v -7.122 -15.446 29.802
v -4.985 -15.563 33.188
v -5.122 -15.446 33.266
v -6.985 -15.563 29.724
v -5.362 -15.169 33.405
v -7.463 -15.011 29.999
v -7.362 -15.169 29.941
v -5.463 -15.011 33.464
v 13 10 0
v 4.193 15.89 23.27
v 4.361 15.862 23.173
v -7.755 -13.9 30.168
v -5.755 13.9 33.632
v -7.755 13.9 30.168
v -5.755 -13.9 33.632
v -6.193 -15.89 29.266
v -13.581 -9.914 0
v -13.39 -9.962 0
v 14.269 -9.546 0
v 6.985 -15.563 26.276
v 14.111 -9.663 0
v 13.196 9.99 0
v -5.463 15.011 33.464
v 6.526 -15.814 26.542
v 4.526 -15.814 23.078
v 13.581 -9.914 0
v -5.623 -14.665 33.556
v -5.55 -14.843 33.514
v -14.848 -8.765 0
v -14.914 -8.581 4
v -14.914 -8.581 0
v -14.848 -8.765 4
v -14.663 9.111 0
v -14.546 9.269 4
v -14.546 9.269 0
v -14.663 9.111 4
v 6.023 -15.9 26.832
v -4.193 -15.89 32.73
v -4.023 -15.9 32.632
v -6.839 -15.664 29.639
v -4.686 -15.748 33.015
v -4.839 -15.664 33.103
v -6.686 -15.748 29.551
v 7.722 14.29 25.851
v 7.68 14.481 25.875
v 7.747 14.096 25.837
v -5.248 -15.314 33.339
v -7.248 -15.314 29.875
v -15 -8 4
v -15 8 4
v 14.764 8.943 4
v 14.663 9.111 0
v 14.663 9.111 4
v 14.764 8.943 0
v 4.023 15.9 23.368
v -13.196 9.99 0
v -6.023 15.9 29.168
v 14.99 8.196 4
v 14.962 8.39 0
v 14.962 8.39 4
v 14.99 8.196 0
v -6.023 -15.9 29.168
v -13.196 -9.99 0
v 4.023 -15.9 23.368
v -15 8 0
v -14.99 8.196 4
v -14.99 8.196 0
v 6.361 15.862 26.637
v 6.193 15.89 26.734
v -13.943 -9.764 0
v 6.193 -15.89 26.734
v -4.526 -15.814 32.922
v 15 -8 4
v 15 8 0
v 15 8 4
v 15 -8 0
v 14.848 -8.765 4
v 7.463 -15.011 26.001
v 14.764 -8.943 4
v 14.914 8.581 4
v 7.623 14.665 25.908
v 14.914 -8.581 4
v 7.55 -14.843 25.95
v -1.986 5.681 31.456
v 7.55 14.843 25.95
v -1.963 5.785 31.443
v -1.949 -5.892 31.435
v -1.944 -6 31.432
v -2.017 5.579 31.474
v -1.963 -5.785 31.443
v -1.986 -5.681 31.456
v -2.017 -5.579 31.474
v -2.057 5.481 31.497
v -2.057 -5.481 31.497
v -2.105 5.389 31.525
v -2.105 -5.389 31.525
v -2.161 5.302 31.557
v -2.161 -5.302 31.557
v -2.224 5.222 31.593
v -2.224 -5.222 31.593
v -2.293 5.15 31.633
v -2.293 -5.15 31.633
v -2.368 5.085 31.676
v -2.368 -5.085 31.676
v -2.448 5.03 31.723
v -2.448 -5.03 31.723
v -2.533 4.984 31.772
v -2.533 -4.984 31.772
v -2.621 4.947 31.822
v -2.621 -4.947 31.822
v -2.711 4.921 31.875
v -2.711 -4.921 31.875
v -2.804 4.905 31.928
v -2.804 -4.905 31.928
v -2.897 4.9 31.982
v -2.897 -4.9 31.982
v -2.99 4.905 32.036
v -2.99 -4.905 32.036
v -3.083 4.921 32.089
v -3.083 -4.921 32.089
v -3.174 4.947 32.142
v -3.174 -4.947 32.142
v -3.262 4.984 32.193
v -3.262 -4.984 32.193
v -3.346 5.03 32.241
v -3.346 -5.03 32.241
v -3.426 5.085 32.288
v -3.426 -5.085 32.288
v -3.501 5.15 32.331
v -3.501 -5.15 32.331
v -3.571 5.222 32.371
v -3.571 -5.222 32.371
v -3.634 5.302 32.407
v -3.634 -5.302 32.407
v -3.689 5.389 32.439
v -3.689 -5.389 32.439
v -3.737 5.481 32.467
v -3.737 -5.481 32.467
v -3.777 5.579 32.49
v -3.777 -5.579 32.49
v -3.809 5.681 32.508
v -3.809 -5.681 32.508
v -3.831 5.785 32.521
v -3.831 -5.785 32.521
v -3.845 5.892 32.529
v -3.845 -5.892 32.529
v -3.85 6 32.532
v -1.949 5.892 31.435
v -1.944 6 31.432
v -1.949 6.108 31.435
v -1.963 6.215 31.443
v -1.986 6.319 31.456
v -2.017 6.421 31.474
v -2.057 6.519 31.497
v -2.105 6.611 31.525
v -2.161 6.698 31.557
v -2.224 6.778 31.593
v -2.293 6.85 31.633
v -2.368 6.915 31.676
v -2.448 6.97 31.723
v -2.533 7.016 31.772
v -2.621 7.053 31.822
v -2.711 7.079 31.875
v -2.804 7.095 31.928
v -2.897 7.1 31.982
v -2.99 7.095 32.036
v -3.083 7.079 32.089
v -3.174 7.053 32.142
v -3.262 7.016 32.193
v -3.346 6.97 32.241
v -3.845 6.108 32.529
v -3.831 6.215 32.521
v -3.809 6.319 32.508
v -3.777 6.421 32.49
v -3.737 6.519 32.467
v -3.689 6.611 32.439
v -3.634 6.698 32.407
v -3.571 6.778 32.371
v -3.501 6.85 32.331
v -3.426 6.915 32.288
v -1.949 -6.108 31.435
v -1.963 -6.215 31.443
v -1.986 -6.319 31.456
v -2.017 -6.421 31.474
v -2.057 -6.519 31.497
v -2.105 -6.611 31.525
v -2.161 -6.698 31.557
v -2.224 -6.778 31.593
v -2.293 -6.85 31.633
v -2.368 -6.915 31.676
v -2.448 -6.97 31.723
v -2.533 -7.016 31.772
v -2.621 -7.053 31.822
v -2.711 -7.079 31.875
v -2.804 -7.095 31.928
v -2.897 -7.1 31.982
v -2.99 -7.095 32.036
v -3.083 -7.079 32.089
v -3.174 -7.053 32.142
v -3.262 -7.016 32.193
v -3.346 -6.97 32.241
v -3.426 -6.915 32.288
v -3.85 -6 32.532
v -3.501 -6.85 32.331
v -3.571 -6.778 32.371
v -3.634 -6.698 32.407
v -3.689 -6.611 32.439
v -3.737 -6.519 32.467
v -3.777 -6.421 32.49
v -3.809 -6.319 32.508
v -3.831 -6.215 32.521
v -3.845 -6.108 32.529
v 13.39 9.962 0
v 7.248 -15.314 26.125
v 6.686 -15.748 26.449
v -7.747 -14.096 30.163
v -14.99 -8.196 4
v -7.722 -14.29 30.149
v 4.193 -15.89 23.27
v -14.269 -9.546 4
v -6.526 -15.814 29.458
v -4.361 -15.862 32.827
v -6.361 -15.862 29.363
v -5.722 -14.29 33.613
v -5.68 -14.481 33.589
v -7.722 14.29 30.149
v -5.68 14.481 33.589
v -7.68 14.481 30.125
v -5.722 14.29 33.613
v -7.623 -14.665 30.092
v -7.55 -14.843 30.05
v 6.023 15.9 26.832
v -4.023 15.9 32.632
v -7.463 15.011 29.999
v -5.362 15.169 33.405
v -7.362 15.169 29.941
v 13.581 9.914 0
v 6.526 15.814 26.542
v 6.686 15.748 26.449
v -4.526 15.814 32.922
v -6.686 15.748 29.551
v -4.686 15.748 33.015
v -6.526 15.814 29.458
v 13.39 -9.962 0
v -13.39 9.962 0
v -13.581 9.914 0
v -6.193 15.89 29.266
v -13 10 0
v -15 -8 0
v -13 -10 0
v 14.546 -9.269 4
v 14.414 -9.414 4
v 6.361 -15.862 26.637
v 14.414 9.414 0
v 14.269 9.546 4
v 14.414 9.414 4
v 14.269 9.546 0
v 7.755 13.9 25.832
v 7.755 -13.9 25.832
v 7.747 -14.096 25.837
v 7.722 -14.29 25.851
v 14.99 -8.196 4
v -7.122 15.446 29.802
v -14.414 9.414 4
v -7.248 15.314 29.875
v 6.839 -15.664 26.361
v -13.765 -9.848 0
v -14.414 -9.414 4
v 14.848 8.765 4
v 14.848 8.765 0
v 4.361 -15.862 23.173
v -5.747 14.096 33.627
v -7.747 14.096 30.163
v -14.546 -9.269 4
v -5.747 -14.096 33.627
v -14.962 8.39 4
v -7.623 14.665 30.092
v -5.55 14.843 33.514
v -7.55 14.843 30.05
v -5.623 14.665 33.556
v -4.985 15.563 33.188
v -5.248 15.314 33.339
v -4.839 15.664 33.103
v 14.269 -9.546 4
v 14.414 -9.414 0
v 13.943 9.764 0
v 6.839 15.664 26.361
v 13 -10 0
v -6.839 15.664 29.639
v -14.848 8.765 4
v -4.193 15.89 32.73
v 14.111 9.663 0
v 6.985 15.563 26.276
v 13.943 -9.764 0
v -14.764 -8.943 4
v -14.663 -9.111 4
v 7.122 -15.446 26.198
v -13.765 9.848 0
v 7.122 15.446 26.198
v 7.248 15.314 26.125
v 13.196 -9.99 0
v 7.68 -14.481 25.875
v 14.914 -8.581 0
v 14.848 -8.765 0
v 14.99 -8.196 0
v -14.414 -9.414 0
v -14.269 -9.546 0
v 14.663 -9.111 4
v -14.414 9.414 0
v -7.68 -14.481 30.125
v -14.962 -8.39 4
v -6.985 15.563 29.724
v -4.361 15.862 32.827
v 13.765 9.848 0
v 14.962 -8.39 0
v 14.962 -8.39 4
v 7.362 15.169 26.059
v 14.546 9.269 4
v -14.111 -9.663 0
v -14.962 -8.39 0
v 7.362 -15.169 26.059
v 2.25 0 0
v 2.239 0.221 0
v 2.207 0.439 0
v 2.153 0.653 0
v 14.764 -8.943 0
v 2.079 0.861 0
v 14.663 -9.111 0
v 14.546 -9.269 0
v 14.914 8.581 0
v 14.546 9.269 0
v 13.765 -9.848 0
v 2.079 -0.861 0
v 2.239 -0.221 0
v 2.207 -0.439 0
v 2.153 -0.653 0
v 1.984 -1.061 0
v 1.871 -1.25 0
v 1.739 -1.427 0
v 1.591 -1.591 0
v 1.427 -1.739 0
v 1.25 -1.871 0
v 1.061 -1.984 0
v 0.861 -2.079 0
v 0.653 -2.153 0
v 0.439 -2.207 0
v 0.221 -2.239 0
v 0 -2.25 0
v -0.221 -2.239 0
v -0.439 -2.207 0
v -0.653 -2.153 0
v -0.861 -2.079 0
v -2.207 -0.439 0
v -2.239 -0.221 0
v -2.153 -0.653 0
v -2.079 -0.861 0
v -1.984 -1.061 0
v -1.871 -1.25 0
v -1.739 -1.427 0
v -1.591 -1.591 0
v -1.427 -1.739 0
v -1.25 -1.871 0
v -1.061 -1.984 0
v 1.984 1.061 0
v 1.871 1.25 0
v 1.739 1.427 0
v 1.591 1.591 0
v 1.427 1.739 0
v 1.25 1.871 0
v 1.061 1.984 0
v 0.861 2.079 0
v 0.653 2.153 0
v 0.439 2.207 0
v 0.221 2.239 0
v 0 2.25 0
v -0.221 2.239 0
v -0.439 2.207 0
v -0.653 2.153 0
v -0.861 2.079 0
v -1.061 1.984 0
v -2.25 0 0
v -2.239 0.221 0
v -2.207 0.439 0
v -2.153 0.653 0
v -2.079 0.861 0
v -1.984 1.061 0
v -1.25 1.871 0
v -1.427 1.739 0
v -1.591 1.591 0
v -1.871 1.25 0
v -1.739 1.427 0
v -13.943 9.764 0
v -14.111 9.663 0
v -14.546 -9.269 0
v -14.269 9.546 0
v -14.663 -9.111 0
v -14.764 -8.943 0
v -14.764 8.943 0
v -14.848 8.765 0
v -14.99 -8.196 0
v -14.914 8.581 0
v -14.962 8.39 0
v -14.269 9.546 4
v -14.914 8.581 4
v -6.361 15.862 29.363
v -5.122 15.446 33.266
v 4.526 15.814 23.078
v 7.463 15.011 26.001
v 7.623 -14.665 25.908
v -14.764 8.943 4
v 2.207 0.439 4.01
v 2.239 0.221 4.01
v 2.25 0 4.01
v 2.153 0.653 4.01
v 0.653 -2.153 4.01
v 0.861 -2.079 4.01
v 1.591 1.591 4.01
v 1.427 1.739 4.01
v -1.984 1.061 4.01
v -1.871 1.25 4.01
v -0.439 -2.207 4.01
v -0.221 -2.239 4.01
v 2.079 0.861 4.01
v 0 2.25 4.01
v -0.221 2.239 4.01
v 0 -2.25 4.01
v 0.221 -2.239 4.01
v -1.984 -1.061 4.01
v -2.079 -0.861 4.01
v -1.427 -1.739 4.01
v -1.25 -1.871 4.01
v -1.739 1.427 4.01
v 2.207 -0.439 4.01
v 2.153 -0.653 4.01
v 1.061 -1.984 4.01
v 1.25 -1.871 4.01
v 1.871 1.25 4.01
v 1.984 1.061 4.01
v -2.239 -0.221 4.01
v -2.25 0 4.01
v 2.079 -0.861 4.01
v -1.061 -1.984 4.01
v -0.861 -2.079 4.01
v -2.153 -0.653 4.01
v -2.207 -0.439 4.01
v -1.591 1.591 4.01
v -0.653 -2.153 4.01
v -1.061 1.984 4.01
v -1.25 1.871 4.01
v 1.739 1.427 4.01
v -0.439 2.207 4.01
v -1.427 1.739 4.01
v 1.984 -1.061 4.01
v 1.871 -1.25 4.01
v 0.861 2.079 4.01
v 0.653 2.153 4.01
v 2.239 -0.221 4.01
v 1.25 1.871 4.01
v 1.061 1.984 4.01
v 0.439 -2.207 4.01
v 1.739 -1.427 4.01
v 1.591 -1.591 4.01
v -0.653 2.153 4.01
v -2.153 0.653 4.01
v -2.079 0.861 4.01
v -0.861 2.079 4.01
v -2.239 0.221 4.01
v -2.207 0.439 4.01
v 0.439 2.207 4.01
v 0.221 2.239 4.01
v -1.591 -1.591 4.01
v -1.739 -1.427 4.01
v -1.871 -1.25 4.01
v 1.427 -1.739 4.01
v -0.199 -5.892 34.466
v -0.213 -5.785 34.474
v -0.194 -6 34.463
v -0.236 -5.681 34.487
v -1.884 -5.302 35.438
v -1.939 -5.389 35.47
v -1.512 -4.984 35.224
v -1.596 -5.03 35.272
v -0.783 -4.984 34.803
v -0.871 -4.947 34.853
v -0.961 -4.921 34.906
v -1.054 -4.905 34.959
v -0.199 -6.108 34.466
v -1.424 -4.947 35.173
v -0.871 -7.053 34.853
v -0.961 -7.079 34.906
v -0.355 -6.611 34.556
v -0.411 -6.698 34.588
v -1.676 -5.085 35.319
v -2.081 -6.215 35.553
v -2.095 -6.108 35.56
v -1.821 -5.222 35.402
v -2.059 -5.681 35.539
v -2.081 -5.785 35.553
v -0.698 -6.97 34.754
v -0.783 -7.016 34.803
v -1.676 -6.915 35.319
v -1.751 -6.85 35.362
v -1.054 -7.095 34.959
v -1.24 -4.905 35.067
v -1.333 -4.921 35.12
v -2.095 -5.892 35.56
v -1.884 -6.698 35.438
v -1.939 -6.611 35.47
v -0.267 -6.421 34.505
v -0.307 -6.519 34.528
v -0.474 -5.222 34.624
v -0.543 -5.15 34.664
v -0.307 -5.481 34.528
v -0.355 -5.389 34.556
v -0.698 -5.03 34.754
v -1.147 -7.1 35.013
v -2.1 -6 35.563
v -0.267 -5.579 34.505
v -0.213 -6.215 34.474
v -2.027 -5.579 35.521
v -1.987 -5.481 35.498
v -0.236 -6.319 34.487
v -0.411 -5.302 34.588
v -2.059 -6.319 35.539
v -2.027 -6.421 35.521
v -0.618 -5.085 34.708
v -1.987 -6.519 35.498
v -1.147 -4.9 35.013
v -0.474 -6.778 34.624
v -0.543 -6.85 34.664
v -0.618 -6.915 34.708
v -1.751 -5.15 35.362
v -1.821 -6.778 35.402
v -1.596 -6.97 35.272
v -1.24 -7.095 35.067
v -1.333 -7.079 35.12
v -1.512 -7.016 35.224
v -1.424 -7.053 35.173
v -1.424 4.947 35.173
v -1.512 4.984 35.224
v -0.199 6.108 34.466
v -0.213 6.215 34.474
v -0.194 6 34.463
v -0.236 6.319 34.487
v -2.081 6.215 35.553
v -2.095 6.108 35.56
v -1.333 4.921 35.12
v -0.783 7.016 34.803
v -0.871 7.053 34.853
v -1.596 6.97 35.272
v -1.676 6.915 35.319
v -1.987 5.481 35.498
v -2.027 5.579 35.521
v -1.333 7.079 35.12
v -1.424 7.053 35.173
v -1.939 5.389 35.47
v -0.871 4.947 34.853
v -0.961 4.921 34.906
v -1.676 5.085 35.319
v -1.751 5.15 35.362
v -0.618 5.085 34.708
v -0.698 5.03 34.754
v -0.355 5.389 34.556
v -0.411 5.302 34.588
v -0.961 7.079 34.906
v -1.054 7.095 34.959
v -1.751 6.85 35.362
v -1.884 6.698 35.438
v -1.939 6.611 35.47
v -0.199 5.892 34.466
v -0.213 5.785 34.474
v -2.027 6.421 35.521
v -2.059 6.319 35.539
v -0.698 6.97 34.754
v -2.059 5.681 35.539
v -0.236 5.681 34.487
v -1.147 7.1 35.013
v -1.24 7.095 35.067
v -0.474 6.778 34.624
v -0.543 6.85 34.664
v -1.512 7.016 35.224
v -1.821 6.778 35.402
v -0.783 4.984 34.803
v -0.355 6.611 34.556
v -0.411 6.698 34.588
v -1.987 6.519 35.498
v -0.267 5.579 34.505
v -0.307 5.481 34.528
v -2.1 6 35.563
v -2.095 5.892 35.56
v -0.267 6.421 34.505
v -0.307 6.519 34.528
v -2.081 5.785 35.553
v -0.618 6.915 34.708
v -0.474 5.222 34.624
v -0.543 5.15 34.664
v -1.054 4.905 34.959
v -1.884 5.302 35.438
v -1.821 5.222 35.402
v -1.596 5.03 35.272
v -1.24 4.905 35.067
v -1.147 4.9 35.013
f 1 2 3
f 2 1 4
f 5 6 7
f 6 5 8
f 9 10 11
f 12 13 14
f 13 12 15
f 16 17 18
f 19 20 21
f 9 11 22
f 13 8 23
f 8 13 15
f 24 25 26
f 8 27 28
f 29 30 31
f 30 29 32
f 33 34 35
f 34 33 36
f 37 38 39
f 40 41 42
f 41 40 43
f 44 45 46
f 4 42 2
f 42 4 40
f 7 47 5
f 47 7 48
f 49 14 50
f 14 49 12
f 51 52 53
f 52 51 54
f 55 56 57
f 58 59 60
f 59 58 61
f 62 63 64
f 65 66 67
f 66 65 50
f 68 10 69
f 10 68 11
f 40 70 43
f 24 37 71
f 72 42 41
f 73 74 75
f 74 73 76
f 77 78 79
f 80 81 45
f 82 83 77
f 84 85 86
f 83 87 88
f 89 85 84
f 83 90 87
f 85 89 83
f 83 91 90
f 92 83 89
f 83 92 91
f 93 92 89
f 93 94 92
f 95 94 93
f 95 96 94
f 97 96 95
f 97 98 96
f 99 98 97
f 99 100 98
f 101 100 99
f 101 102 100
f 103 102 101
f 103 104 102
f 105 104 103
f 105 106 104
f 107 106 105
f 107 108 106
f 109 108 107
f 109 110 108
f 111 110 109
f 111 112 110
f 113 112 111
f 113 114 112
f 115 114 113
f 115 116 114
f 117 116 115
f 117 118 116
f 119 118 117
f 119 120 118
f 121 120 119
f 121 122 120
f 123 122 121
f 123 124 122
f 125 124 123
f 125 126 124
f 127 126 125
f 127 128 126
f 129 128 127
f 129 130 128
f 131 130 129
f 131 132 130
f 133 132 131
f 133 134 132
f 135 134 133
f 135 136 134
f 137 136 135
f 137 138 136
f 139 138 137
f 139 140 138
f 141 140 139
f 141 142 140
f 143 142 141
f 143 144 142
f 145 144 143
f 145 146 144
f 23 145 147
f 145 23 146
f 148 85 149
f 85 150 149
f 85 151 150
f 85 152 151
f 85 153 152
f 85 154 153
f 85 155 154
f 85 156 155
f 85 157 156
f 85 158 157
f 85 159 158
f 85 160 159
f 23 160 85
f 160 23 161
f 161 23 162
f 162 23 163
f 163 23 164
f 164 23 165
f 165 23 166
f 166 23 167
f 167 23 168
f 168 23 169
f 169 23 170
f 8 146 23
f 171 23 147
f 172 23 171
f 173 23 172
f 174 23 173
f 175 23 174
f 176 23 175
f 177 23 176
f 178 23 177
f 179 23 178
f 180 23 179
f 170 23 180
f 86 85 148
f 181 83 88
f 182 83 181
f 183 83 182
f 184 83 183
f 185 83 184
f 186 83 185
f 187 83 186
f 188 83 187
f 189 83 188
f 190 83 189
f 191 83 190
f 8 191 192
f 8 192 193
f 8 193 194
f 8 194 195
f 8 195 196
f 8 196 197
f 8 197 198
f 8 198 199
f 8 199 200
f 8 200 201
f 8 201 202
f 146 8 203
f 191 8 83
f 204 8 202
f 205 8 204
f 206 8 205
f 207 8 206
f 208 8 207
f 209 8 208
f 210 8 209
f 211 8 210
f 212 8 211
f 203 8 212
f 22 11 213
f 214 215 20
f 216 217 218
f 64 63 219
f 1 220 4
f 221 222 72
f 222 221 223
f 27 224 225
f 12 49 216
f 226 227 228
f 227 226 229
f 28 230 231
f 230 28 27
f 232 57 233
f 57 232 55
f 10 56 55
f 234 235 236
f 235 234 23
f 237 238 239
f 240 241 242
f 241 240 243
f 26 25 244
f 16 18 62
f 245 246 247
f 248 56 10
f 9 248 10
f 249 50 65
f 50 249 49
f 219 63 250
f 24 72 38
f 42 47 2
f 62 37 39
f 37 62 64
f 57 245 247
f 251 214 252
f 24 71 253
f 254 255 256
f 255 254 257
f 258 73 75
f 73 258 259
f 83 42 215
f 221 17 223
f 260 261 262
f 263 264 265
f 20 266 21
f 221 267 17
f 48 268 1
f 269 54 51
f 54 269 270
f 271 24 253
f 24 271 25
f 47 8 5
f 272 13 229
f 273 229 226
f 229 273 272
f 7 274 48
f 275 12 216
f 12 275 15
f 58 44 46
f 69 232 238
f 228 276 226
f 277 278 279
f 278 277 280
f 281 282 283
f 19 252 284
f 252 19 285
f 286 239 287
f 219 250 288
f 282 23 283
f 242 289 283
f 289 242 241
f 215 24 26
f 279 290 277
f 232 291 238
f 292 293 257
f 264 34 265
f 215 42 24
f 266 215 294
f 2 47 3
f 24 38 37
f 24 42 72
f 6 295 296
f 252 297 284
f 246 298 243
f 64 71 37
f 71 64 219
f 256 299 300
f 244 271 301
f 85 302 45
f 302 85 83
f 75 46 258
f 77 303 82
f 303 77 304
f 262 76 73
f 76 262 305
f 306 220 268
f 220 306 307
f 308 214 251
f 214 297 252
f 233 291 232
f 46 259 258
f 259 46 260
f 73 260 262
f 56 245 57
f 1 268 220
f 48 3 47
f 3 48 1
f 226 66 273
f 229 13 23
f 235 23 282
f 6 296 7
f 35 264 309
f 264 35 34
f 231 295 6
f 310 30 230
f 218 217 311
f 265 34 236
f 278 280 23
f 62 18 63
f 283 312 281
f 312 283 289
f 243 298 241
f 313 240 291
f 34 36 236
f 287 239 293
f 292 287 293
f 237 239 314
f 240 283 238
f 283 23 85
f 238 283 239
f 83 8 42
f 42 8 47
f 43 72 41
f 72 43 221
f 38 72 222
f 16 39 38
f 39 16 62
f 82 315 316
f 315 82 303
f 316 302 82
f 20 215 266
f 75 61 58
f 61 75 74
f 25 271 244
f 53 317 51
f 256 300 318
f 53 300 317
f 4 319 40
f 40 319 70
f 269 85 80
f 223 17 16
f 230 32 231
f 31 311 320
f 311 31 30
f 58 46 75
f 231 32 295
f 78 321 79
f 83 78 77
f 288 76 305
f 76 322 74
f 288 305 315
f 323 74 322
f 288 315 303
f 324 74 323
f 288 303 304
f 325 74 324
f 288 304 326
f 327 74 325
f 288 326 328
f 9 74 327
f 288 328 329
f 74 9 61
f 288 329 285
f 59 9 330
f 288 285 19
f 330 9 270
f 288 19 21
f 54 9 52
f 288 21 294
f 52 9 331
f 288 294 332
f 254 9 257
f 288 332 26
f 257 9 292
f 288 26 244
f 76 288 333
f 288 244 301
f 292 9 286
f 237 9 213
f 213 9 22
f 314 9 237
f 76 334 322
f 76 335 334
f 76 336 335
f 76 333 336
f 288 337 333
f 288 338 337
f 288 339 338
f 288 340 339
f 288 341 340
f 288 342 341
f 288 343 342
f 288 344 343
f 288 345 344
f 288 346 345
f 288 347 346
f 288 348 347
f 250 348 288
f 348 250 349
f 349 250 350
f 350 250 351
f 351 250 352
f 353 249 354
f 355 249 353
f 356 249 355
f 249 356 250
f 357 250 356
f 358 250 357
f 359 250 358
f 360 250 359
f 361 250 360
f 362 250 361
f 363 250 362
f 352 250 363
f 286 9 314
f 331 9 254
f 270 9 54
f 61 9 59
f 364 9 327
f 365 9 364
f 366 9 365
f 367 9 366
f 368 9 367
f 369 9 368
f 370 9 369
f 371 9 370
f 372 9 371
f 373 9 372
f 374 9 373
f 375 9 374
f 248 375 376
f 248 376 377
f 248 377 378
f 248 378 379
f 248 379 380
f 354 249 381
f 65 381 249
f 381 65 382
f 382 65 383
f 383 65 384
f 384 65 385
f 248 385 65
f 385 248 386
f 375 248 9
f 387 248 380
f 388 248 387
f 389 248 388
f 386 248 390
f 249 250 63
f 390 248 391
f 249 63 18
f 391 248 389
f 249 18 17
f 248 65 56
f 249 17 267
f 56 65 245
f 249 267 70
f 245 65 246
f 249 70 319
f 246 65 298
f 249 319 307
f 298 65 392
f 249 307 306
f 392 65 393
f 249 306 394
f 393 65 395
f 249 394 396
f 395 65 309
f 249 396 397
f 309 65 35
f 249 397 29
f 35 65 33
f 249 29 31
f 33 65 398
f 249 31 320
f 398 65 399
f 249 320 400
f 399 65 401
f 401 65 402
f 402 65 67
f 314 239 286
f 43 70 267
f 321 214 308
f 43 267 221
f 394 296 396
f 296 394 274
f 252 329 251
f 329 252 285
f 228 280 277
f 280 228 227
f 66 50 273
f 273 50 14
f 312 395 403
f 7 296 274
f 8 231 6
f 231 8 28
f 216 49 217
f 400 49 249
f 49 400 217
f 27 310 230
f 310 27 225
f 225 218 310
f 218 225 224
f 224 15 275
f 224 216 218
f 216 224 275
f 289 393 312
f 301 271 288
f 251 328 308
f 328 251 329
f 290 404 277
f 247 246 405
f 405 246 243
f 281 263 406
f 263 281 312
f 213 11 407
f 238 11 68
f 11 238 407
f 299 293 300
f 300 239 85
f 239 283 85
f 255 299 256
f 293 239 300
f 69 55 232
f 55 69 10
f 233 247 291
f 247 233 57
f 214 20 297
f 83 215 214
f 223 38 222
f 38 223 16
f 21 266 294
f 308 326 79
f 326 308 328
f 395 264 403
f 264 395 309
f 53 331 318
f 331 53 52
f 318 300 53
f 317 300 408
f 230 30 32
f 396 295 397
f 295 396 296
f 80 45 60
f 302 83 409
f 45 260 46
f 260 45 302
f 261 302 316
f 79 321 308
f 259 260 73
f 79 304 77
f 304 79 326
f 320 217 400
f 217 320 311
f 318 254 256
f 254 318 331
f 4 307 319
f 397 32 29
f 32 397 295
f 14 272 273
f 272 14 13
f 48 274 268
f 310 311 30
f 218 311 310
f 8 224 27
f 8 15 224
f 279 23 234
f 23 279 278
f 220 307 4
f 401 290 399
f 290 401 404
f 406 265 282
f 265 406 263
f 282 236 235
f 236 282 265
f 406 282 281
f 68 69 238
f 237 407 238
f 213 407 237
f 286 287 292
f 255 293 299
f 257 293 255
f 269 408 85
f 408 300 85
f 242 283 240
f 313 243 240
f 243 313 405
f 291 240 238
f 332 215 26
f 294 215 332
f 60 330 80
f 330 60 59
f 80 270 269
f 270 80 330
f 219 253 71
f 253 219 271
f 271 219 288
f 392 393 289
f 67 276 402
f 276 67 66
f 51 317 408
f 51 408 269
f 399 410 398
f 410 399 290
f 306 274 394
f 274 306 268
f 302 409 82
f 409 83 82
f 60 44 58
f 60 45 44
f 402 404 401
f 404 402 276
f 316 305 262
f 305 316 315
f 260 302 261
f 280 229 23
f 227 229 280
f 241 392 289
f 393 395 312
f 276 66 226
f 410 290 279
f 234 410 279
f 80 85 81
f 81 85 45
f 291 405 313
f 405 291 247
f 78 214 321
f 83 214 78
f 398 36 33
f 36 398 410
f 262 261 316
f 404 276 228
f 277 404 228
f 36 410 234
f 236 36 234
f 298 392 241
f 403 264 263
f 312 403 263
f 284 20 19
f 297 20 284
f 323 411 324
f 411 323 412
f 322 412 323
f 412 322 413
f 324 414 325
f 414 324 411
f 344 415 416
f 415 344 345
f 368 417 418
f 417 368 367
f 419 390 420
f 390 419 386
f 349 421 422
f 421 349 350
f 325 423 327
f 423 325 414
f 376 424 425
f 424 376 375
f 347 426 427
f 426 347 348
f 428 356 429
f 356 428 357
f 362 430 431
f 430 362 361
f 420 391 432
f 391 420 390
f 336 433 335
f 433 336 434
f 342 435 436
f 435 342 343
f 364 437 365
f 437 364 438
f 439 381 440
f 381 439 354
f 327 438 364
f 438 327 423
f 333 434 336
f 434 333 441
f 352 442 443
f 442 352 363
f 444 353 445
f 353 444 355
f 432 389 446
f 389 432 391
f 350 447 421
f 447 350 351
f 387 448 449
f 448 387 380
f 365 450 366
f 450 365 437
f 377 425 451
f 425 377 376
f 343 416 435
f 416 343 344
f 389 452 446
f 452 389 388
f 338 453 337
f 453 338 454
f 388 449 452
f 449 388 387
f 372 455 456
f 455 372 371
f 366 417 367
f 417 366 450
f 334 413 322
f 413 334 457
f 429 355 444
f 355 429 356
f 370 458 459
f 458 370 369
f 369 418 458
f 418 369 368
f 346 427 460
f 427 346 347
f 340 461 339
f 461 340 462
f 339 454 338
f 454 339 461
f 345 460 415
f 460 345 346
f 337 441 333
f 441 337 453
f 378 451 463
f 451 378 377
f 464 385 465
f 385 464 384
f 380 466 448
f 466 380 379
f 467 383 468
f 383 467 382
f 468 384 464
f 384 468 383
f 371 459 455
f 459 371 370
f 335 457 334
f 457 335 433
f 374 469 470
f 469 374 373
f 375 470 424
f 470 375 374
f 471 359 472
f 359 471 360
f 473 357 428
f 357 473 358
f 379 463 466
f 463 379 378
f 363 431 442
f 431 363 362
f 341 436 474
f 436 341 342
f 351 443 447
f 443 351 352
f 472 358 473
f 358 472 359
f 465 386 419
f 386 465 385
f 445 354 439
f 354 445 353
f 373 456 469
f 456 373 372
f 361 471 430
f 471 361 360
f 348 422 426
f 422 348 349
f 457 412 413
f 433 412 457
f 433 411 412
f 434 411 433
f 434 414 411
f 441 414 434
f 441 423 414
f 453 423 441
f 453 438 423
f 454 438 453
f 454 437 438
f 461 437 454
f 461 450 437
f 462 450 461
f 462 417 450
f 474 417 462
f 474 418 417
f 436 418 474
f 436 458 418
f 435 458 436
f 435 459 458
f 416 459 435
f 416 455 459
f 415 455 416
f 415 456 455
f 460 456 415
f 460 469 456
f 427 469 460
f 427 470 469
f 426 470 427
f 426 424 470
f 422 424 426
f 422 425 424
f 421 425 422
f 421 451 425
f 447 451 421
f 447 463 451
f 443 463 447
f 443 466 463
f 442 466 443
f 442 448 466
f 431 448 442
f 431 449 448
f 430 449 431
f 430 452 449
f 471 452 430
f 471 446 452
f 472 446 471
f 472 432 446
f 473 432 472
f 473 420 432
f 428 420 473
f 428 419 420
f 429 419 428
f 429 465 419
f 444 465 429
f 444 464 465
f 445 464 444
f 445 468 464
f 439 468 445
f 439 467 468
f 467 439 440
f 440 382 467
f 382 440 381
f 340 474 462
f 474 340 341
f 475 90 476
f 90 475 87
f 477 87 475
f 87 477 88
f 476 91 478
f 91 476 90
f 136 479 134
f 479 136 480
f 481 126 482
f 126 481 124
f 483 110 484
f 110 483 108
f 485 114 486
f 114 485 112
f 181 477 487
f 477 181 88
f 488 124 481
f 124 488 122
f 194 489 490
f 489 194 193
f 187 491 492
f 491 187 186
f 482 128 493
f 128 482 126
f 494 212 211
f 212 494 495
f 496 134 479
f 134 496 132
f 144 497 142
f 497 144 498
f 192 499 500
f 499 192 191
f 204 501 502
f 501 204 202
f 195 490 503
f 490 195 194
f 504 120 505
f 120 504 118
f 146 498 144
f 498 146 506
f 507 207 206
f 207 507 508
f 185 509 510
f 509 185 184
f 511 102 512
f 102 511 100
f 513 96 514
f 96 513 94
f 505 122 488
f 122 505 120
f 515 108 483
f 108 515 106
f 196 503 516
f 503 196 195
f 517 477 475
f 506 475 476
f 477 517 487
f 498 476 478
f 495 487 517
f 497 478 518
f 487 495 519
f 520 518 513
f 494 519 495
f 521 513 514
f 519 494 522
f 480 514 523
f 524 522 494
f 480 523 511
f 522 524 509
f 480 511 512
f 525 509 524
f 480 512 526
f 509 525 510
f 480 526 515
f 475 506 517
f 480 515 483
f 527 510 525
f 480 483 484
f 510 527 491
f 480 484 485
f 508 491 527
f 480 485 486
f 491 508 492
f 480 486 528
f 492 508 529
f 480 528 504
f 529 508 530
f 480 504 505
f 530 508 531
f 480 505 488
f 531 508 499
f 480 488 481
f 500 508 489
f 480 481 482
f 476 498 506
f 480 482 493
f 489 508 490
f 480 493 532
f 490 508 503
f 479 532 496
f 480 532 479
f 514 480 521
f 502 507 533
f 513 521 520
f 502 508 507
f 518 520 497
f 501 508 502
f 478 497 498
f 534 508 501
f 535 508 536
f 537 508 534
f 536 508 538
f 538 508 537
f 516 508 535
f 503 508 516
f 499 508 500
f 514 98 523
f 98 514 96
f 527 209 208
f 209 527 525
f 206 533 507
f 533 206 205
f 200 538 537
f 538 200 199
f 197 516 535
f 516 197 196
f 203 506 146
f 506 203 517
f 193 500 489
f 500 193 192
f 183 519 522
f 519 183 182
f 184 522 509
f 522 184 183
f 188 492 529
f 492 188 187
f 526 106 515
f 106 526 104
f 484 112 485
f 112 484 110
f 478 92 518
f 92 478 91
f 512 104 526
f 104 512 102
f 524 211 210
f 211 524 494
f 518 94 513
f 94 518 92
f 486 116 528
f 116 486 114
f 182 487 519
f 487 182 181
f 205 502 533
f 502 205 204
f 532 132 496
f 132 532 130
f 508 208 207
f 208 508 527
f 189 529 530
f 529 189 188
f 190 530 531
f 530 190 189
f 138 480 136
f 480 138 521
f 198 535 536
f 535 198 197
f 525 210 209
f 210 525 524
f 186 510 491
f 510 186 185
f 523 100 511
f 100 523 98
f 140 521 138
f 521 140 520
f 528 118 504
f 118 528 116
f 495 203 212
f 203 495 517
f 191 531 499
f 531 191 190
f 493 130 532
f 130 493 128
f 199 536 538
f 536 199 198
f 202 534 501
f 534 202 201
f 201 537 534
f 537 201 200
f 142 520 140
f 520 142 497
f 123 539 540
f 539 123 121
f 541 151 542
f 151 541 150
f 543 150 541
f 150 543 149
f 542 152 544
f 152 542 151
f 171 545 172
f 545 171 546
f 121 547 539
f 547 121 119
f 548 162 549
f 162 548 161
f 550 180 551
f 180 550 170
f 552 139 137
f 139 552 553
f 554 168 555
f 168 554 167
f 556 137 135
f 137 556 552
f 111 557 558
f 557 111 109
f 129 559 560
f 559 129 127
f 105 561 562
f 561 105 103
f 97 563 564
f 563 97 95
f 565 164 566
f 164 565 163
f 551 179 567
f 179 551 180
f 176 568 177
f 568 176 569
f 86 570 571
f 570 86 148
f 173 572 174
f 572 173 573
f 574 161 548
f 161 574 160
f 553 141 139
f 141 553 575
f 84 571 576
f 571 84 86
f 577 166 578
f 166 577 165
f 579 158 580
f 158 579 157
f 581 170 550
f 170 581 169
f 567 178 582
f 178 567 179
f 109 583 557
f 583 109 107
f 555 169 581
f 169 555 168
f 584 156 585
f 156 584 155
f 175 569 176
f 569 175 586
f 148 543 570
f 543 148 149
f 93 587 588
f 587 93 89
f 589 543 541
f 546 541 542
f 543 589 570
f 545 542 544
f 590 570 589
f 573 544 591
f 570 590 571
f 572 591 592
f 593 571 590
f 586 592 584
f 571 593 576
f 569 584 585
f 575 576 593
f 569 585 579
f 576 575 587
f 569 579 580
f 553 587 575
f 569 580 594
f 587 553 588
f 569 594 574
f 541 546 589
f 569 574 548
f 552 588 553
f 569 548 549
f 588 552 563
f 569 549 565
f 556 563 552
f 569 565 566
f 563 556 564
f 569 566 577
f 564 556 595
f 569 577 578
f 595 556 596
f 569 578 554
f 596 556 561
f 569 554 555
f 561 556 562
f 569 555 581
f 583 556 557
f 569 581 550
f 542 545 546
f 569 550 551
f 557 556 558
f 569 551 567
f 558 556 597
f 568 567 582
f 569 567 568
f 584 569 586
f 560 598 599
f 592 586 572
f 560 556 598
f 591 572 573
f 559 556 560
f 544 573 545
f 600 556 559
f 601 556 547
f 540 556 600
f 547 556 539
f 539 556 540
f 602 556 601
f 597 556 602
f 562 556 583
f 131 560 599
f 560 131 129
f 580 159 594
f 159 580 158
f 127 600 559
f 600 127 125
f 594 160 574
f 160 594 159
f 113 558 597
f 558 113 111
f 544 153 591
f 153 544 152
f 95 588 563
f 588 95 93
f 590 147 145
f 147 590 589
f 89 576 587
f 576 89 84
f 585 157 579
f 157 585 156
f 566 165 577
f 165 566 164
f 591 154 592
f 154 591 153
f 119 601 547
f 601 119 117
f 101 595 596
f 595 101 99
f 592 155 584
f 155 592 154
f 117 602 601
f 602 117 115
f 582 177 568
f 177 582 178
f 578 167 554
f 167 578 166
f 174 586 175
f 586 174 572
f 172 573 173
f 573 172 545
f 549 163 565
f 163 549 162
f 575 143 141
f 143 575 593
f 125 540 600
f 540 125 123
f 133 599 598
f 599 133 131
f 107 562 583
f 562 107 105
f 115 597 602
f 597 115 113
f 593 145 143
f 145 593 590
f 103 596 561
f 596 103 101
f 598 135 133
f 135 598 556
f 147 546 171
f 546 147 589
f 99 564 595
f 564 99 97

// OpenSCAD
// esp32s3-cam-case.scad — parametric friction-fit enclosure for the
// nulllaborg ESP32-S3-CAM (https://github.com/nulllaborg/esp32s3-cam).
//
// Author note: every dimension that depends on the actual board is
// flagged "MEASURE" — take calipers to your unit before printing the
// final pieces. The defaults below come from the size drawing in the
// nulllaborg repo (picture/esp32s3_cam_size.png); the very first thing
// to do is print the back_shell at 0% infill, drop your bare board in,
// and confirm it lands cleanly on the four post shoulders.
//
// Construction:
//   - Two-piece body: back_shell (USB cutout) and lid (lens window,
//     flash LED holes). They join via mating posts (lid) and shafts
//     (back) with a tunable friction fit — no screws, no snap hooks.
//   - PCB is captured by four stepped posts rising from the back-shell
//     cavity floor: a wide shoulder under the PCB acts as a positive
//     vertical stop the board lands on, and a narrower shaft above
//     passes through the M2 mounting holes and protrudes up into the
//     lid's bores.
//   - Lens window in the lid lets the FFC-mounted camera lens look
//     out the top. Two small holes flanking the lens align with the
//     GPIO3 flash LEDs on the PCB.
//   - A pry slot at one corner of the seam accepts a flat tool to
//     re-open the case.
//
// Top-of-file `mode` selects what to render:
//   "lid" / "back" / "assembly" / "exploded" / "hanger"

mode = "hanger";

// =============================================================
// FEATURE TOGGLES — flip these to include/exclude optional parts.
// =============================================================
USE_USB_C          = true;    // USB-C cutout on the right short edge
USE_FLASH_HOLES    = true;    // 2 holes in lid for the GPIO3 flash LEDs
USE_SD_SLOT        = true;   // microSD slot on bottom long edge
USE_BUTTON_HOLES   = false;   // BOOT + RESET pinholes (paperclip access)
USE_IPEX_CUTOUT    = false;   // slot for external antenna pigtail
USE_BATTERY_CUTOUT = false;   // slot for JST PH2.0 battery cable
USE_VENTS          = false;   // vent slot grid on back face
USE_KEYHOLE        = false;   // wall-mount keyhole on back face
USE_HANGER_SOCKETS = true;   // 2 sockets on -X face for the hanger pegs

// =============================================================
// PARAMETERS — tune these to match your board and your printer.
// Almost every issue you'll hit on first print is fixable here
// without touching the geometry below.
// =============================================================

// ----- PCB ----------------------------------------------------
// From picture/esp32s3_cam_size.png. MEASURE on your board.
PCB_LEN              = 40.0;   // long edge of the PCB
PCB_WID              = 27.0;   // short edge
PCB_THK              =  1.6;   // PCB thickness alone
MOUNT_HOLE_DIAM      =  2.7;   // M2 clearance (through-hole on PCB)
MOUNT_HOLE_INSET     =  2.0;   // centre-of-hole to nearest PCB edge

// ----- Camera lens window (in the lid) ------------------------
// The camera module floats on a 24-pin FFC, so its position is
// mechanically flexible. The lens folds over the WROOM-1 module and
// looks straight up through this hole. MEASURE/ADJUST as needed.
LENS_HOLE_DIAM       =  10.0;   // ~OV2640/OV3660 lens barrel clearance
LENS_HOLE_X          = 11.5;   // PCB-local X of hole centre
LENS_HOLE_Y          = PCB_WID / 2;   // PCB-local Y of hole centre

// ----- Flash LED holes (in the lid) ---------------------------
// Two white SMD flash LEDs on the PCB top side, flanking the camera
// FFC connector along the SHORT edge of the PCB opposite the USB-C
// (i.e. the -X short edge). The LEDs sit along that short edge with
// the FFC connector between them. MEASURE on your board.
FLASH_LED_HOLE_DIAM   =  3.0;
FLASH_LED_PITCH       = -22.0;  // centre-to-centre distance between LEDs (along Y)
FLASH_LED_X_FROM_EDGE =  9.0;  // distance from PCB -X edge to LED centres

// ----- USB-C connector (PCB +X short edge, surface-mount) -----
// "Y position" = distance from PCB -Y edge to centre of connector.
// The cutout sizes below are CABLE OVERMOLD clearances, not the
// connector body — they're deliberately larger than the connector so
// a typical USB-C cable's overmolded plug can be inserted. The
// connector body itself is ~8.94 × 3.26 mm, but cables won't fit if
// the opening is only that size.
// MEASURE on your board; bump up if your cable still won't fit.
USB_C_WIDTH          = 9.0;   // cable-overmold clearance, width
USB_C_HEIGHT         =  5.0;   // cable-overmold clearance, height
USB_C_Y_CENTER       = PCB_WID / 2;   // centred on short edge
USB_C_Z_OFFSET       =  3.2;   // centre relative to PCB BOTTOM (positive = above PCB)
USB_CUTOUT_SLACK     =  0.6;   // extra clearance around the cutout

// ----- microSD slot (bottom long edge, optional) --------------
SD_SLOT_WIDTH        = 13.0;
SD_SLOT_HEIGHT       =  2.0;
SD_SLOT_X_CENTER     = 12.5;   // PCB-local X of slot centre — MEASURE
SD_SLOT_Z_OFFSET     =  2.5;   // centre relative to PCB BOTTOM
SD_CUTOUT_SLACK      =  0.8;

// ----- Button pinholes (BOOT/RESET, optional) -----------------
BUTTON_HOLE_DIAM     =  2.0;
BOOT_BTN_X_FROM_EDGE =  3.0;   // BOOT: PCB +X, -Y corner; MEASURE
BOOT_BTN_Y_FROM_EDGE =  3.0;
RESET_BTN_X_FROM_EDGE = 3.0;   // RESET: PCB +X, +Y corner; MEASURE
RESET_BTN_Y_FROM_EDGE = 3.0;
BUTTON_Z_OFFSET      =  2.5;   // centre above PCB bottom

// ----- IPEX antenna cutout (optional) -------------------------
IPEX_CUTOUT_W        =  6.0;
IPEX_CUTOUT_H        =  3.0;
IPEX_Z_OFFSET        =  2.5;

// ----- Battery JST PH2.0 cutout (optional) --------------------
BATTERY_CUTOUT_W     =  6.5;
BATTERY_CUTOUT_H     =  3.5;
BATTERY_X_CENTER     =  8.0;   // PCB-local X — MEASURE
BATTERY_Z_OFFSET     =  2.5;

// ----- Case body / fit ----------------------------------------
WALL                 =  2.0;
PCB_PERIMETER_GAP    =  0.4;   // case-to-PCB tolerance (each side)
BACK_DEPTH           =  3.0;   // space below PCB (bottom of S3-CAM is flat)
FRONT_DEPTH          = 7.0;   // space above PCB (camera lens stack-up)
CASE_FILLET          =  2.0;   // outer corner rounding
$fn                  = 64;

// ----- PCB-retention posts (scaled for M2 — see hydro-dash for
// the same idiom with M2.5). Stepped post: wider SHOULDER below
// the PCB acts as a positive stop the board sits on (so you can't
// push it past), transitioning into a narrower shaft that passes
// through the M2 mounting hole and continues up past the PCB top
// by PCB_POST_PROTRUDE — far enough for the lid's mating tubes to
// slide over and create the friction fit that holds the case shut.
//
// Cross-section profile:
//                             ___       <- chamfered tip
//                            |   |
//                            |   |       <- upper shaft (through PCB,
//                            |   |          PCB_POST_DIAM dia)
//                       _____|___|_____  <- PCB rests here on shoulder
//                      |               |
//                      |               | <- shoulder
//                      |               |    (PCB_POST_SHOULDER_DIAM dia)
//                      |               |
//                      ----------------- <- back-shell cavity floor
//
// Shoulder diameter is smaller than the hydro-dash reference (4.5mm)
// because the S3-CAM's MOUNT_HOLE_INSET is only 3.2mm; a 4.5mm
// shoulder would overhang the PCB edge.
PCB_POST_SHOULDER_DIAM =  3.6; // wider seat the PCB rests on
PCB_POST_DIAM          =  2.0; // upper shaft, through M2 hole fit
PCB_POST_PROTRUDE      =  3.5; // shaft extends above PCB top to engage lid bore

// ----- Lid mating posts ---------------------------------------
// Hollow cylindrical tubes hanging from the lid ceiling, one per PCB
// mounting-hole position. Each slides OVER the protruding tip of the
// corresponding back-shell post. Friction between the bore and the
// back post shaft is what holds the case together — there are no
// snap hooks.
//
// Tune FRONT_BORE_DIAM until you get the click feel you want:
//   - too loose? decrease (toward PCB_POST_DIAM = 1.7)
//   - too tight? increase by 0.05 mm at a time
FRONT_POST_OD        =  3.6;
FRONT_BORE_DIAM      =  2.2;   // light interference with 1.7mm shaft
FRONT_POST_LEN       =  7.5;
FRONT_BORE_TOP_GAP   =  1.0;

// ----- Pry slot (for disassembly) -----------------------------
// Open slot at one corner of the seam — accepts a flat tool to twist
// the two halves apart when you need to re-open the case.
PRY_SLOT_W           =  5.0;
PRY_SLOT_D           =  1.5;

// ----- Wall mount keyhole (optional) --------------------------
KEYHOLE_DIAM_BIG     =  8.0;
KEYHOLE_DIAM_SMALL   =  4.0;
KEYHOLE_SLOT_LEN     =  6.0;
KEYHOLE_DEPTH        =  1.2;
KEYHOLE_OFFSET_FROM_TOP = 8.0;

// ----- Vent slots (optional) ----------------------------------
VENT_SLOT_LEN        = 12.0;
VENT_SLOT_W          =  1.2;
VENT_ROWS            =  2;
VENT_COLS            =  3;
VENT_PITCH_X         =  3.0;
VENT_PITCH_Y         =  2.5;

// ----- Hanger bracket (optional, mode="hanger") ---------------
// Standalone snap-on bracket that mates with the case's -X short edge
// (opposite USB-C). Two short pegs project from the hanger's mount face
// into matching sockets on the back-shell wall (subtracted only when
// USE_HANGER_SOCKETS is true). The body holds the case at a configurable
// tilt; the top tab takes a single M4 screw up into a light fixture.
//
// Geometry parameter: HANGER_TILT_DEG is the angle between the fixture
// tab (horizontal when installed) and the case-mount face. Equals the
// camera lens's angle from vertical when mounted:
//   0°  = camera looks straight down
//   45° = camera looks down-and-forward at 45° (default — good for
//         monitoring a tray below)
//   90° = camera looks straight forward (horizontal)
HANGER_TILT_DEG      = 30.0;
HANGER_BODY_HEIGHT   = 30.0;   // body height in print orientation
HANGER_PEG_DIAM      =  2.2;   // peg diameter
HANGER_PEG_LEN       =  3.5;   // peg length
HANGER_PEG_GAP       = 12.0;   // centre-to-centre between the two pegs.
                               // Kept narrow so sockets clear the corner
                               // friction-fit posts (PCB_POST_SHOULDER_DIAM
                               // at y=MOUNT_HOLE_INSET and y=PCB_WID-INSET).
HANGER_TAB_W         = 30.0;   // fixture tab width (across)
HANGER_TAB_D         = 20.0;   // fixture tab depth (front-to-back)
HANGER_TAB_T         =  4.0;   // fixture tab thickness
HANGER_SCREW_HOLE    =  4.5;   // M4 clearance for ceiling/fixture screw
HANGER_SLAB_T        =  4.0;   // case-mount slab thickness

// =============================================================
// DERIVED CONSTANTS — usually no need to touch
// =============================================================
INNER_X              = PCB_LEN + 2*PCB_PERIMETER_GAP;
INNER_Y              = PCB_WID + 2*PCB_PERIMETER_GAP;
OUTER_X              = INNER_X + 2*WALL;
OUTER_Y              = INNER_Y + 2*WALL;
TOTAL_HEIGHT         = WALL + BACK_DEPTH + PCB_THK + FRONT_DEPTH + WALL;
SEAM_Z               = WALL + BACK_DEPTH + PCB_THK;  // lid meets back here

// Mount-hole positions (PCB local coords). Order: BL, BR, TR, TL.
mount_hole_xy = [
  [MOUNT_HOLE_INSET,           MOUNT_HOLE_INSET],
  [PCB_LEN - MOUNT_HOLE_INSET, MOUNT_HOLE_INSET],
  [PCB_LEN - MOUNT_HOLE_INSET, PCB_WID - MOUNT_HOLE_INSET],
  [MOUNT_HOLE_INSET,           PCB_WID - MOUNT_HOLE_INSET],
];

// =============================================================
// HELPER MODULES
// =============================================================

// 2D rounded square -> extruded box with filleted vertical edges
module rounded_box(x, y, z, r=CASE_FILLET) {
  linear_extrude(z)
    offset(r=r) offset(r=-r) square([x, y]);
}

// PCB alignment post — stepped: wide shoulder below PCB, narrow shaft
// through PCB and above. The shoulder's top face is the surface the
// PCB rests on (positive vertical stop, can't be pushed past).
module pcb_post(h_below_pcb, h_above_pcb) {
  upper_h = PCB_THK + h_above_pcb;
  // Shoulder (below PCB)
  cylinder(d=PCB_POST_SHOULDER_DIAM, h=h_below_pcb);
  // Upper shaft (through PCB hole + protrude into lid bore)
  translate([0, 0, h_below_pcb]) {
    cylinder(d=PCB_POST_DIAM, h=upper_h - 0.6);
    // Chamfered tip — narrows over the top 0.6mm so the bore (and the
    // PCB hole on insertion) can self-centre on the post.
    translate([0, 0, upper_h - 0.6])
      cylinder(d1=PCB_POST_DIAM, d2=PCB_POST_DIAM - 0.6, h=0.6);
  }
}

// USB connector cutout — runs through the +X short wall.
// y_center: PCB-local Y of cutout centre. z_offset: vertical position
// relative to PCB BOTTOM surface (positive = above PCB bottom).
module usb_cutout(y_center, w, h, z_offset) {
  translate([PCB_LEN + PCB_PERIMETER_GAP - 0.5,
             y_center - w/2 - USB_CUTOUT_SLACK/2,
             WALL + BACK_DEPTH + z_offset - h/2 - USB_CUTOUT_SLACK/2])
    cube([WALL + 1.5,
          w + USB_CUTOUT_SLACK,
          h + USB_CUTOUT_SLACK]);
}

// microSD slot cutout — through the -Y long wall.
module sd_slot_cutout() {
  translate([SD_SLOT_X_CENTER - SD_SLOT_WIDTH/2 - SD_CUTOUT_SLACK/2,
             -WALL - PCB_PERIMETER_GAP - 0.5,
             WALL + BACK_DEPTH + SD_SLOT_Z_OFFSET - SD_SLOT_HEIGHT/2 - SD_CUTOUT_SLACK/2])
    cube([SD_SLOT_WIDTH + SD_CUTOUT_SLACK,
          WALL + 1.5,
          SD_SLOT_HEIGHT + SD_CUTOUT_SLACK]);
}

// IPEX antenna cutout — through the -X short wall, top-Y corner.
module ipex_cutout() {
  translate([-WALL - PCB_PERIMETER_GAP - 0.5,
             PCB_WID - IPEX_CUTOUT_W - 1.0,
             WALL + BACK_DEPTH + IPEX_Z_OFFSET - IPEX_CUTOUT_H/2])
    cube([WALL + 1.5, IPEX_CUTOUT_W, IPEX_CUTOUT_H]);
}

// JST PH2.0 battery connector cutout — through the -Y long wall.
module battery_cutout() {
  translate([BATTERY_X_CENTER - BATTERY_CUTOUT_W/2,
             -WALL - PCB_PERIMETER_GAP - 0.5,
             WALL + BACK_DEPTH + BATTERY_Z_OFFSET - BATTERY_CUTOUT_H/2])
    cube([BATTERY_CUTOUT_W, WALL + 1.5, BATTERY_CUTOUT_H]);
}

// BOOT/RESET pinhole — through the +X short wall at a given corner.
module button_pinhole(y_from_edge, name="boot") {
  // name = "boot" → -Y corner, "reset" → +Y corner
  y = (name == "reset") ? (PCB_WID - y_from_edge) : y_from_edge;
  translate([PCB_LEN + PCB_PERIMETER_GAP - 0.5,
             y,
             WALL + BACK_DEPTH + BUTTON_Z_OFFSET])
    rotate([0, 90, 0])
      cylinder(d=BUTTON_HOLE_DIAM, h=WALL + 1.5);
}

// Wall-mount keyhole (subtractive). Cuts through back face.
// Big circle on top (screw head slips in); slot extending in +Y so
// gravity catches the case on the screw shaft below.
module keyhole_negative() {
  cylinder(d=KEYHOLE_DIAM_BIG, h=WALL + 1);
  hull() {
    cylinder(d=KEYHOLE_DIAM_SMALL, h=WALL + 1);
    translate([0, KEYHOLE_SLOT_LEN, 0])
      cylinder(d=KEYHOLE_DIAM_SMALL, h=WALL + 1);
  }
  // Recess for screw head on the OUTER face (so head sits flush)
  translate([0, 0, -0.01])
    cylinder(d=KEYHOLE_DIAM_BIG + 1, h=KEYHOLE_DEPTH);
}

// Vent slot grid (subtractive)
module vent_grid_negative() {
  for (cx = [0 : VENT_COLS - 1])
    for (cy = [0 : VENT_ROWS - 1])
      translate([cx * VENT_PITCH_X, cy * (VENT_SLOT_W + VENT_PITCH_Y), 0])
        cube([VENT_SLOT_LEN, VENT_SLOT_W, WALL + 1]);
}

// Hanger snap-fit sockets on the back-shell's -X exterior face.
// Two cylindrical bores penetrating in the +X direction, sized for a
// light friction fit with the hanger's pegs. Bore depth is slightly
// more than peg length so the peg seats flush with the case face. The
// bore goes through the WALL = 2.0 mm wall and protrudes ~2 mm into
// the cavity below the PCB — empty space (clear of friction-fit posts
// at corners thanks to the narrow HANGER_PEG_GAP).
module hanger_socket_negative() {
  socket_diam  = HANGER_PEG_DIAM + 0.3;   // fit clearance
  socket_depth = HANGER_PEG_LEN + 0.5;    // a hair deeper than the peg
  for (dy = [-HANGER_PEG_GAP/2, HANGER_PEG_GAP/2])
    translate([-WALL - PCB_PERIMETER_GAP - 0.01,
               PCB_WID/2 + dy,
               SEAM_Z / 2])
      rotate([0, 90, 0])
        cylinder(d=socket_diam, h=socket_depth);
}

// =============================================================
// PCB DUMMY (visualization only)
// =============================================================
module pcb_dummy() {
  color("green", 0.7) {
    // PCB itself
    translate([0, 0, WALL + BACK_DEPTH])
      cube([PCB_LEN, PCB_WID, PCB_THK]);
    // WROOM-1 module sitting on top, roughly centred
    color("dimgray")
      translate([PCB_LEN/2 - 9.0, PCB_WID/2 - 8.0,
                 WALL + BACK_DEPTH + PCB_THK])
        cube([18.0, 16.0, 3.3]);
    // Camera lens stack, indicated as a small puck above the WROOM-1
    color("black")
      translate([LENS_HOLE_X, LENS_HOLE_Y,
                 WALL + BACK_DEPTH + PCB_THK + 3.3])
        cylinder(d=8.0, h=5.0);
  }
}

// =============================================================
// LID — viewer side. Camera lens window, flash LED holes, lid
// mating tubes pointing down, pry slot.
// =============================================================
module lid() {
  union() {
    difference() {
      // Outer body
      translate([-WALL - PCB_PERIMETER_GAP, -WALL - PCB_PERIMETER_GAP, SEAM_Z])
        rounded_box(OUTER_X, OUTER_Y, FRONT_DEPTH + WALL);

      // Inside cavity — hollow out the underside of the lid
      translate([-PCB_PERIMETER_GAP, -PCB_PERIMETER_GAP, SEAM_Z - 0.01])
        cube([INNER_X, INNER_Y, FRONT_DEPTH + 0.02]);

      // Lens window — through the top face
      translate([LENS_HOLE_X, LENS_HOLE_Y,
                 SEAM_Z + FRONT_DEPTH - 0.01])
        cylinder(d=LENS_HOLE_DIAM, h=WALL + 1);

      // Flash LED holes — along the -X short edge of the PCB,
      // flanking the camera FFC connector along the Y axis.
      if (USE_FLASH_HOLES) {
        led_x = FLASH_LED_X_FROM_EDGE;
        for (dy = [-FLASH_LED_PITCH/2])
          translate([led_x, PCB_WID/2 + dy,
                     SEAM_Z + FRONT_DEPTH - 0.01])
            cylinder(d=FLASH_LED_HOLE_DIAM, h=WALL + 1);
      }

      // USB-C cutout — the connector sits ABOVE the PCB top, which is
      // the seam. The cutout cube straddles the seam: lower portion is
      // cut from the back shell, upper portion from the lid. Both
      // halves' difference() blocks subtract the same cube so the
      // opening passes cleanly through the seam.
      if (USE_USB_C)
        usb_cutout(USB_C_Y_CENTER, USB_C_WIDTH, USB_C_HEIGHT, USB_C_Z_OFFSET);

      // microSD / BOOT-RESET / IPEX / battery cutouts also straddle
      // the seam (the components sit on top of the PCB). Subtract them
      // from the lid as well as the back shell.
      if (USE_SD_SLOT)         sd_slot_cutout();
      if (USE_BUTTON_HOLES) {
        button_pinhole(BOOT_BTN_Y_FROM_EDGE, "boot");
        button_pinhole(RESET_BTN_Y_FROM_EDGE, "reset");
      }
      if (USE_IPEX_CUTOUT)     ipex_cutout();
      if (USE_BATTERY_CUTOUT)  battery_cutout();

      // Pry slot at one corner so a flat tool can split the seam.
      // Placed at the (-X, -Y) corner — opposite the USB-C side.
      translate([-WALL - PCB_PERIMETER_GAP, -WALL - PCB_PERIMETER_GAP - 0.01,
                 SEAM_Z - 0.01])
        cube([PRY_SLOT_W, WALL + 0.5, PRY_SLOT_D]);
    }

    // Mating tubes — hollow cylinders hanging from the ceiling at each
    // PCB mounting-hole position. Each slides over the protruding tip
    // of the back-shell post; friction between the bore and the back
    // post shaft holds the case closed.
    for (p = mount_hole_xy)
      translate([p[0], p[1], SEAM_Z + FRONT_DEPTH - FRONT_POST_LEN])
        difference() {
          cylinder(d=FRONT_POST_OD, h=FRONT_POST_LEN);
          // Bore: open at the bottom, closed FRONT_BORE_TOP_GAP from top
          translate([0, 0, -0.01])
            cylinder(d=FRONT_BORE_DIAM,
                     h=FRONT_POST_LEN - FRONT_BORE_TOP_GAP + 0.01);
        }
  }
}

// =============================================================
// BACK SHELL — cable side. USB-C cutout (default), optional SD /
// button / antenna / battery / vent / keyhole features, and the
// four PCB-retention posts.
// =============================================================
module back_shell() {
  union() {
    // Outer body and all subtractive features. PCB-retention posts
    // are added AFTER this difference so the cavity cube doesn't
    // truncate them.
    difference() {
      // Outer body
      translate([-WALL - PCB_PERIMETER_GAP, -WALL - PCB_PERIMETER_GAP, 0])
        rounded_box(OUTER_X, OUTER_Y, WALL + BACK_DEPTH + PCB_THK);

      // Inner cavity (hollow tray below the PCB seat)
      translate([-PCB_PERIMETER_GAP, -PCB_PERIMETER_GAP, WALL])
        cube([INNER_X, INNER_Y, BACK_DEPTH + PCB_THK + 0.01]);

      // USB-C cutout
      if (USE_USB_C)
        usb_cutout(USB_C_Y_CENTER, USB_C_WIDTH, USB_C_HEIGHT, USB_C_Z_OFFSET);

      // microSD slot
      if (USE_SD_SLOT) sd_slot_cutout();

      // BOOT/RESET pinholes
      if (USE_BUTTON_HOLES) {
        button_pinhole(BOOT_BTN_Y_FROM_EDGE, "boot");
        button_pinhole(RESET_BTN_Y_FROM_EDGE, "reset");
      }

      // IPEX antenna cutout
      if (USE_IPEX_CUTOUT) ipex_cutout();

      // Battery JST cutout
      if (USE_BATTERY_CUTOUT) battery_cutout();

      // Wall-mount keyhole on the back face
      if (USE_KEYHOLE) back_keyhole();

      // Vent slot grid on the back face
      if (USE_VENTS) back_vents();

      // Snap-fit sockets on -X face for the optional hanger bracket
      if (USE_HANGER_SOCKETS) hanger_socket_negative();
    }

    // PCB-retention posts — rise from the cavity floor at z=WALL
    // through the PCB and protrude into the lid's mating tubes.
    for (p = mount_hole_xy)
      translate([p[0], p[1], WALL])
        pcb_post(BACK_DEPTH - 0.5, PCB_POST_PROTRUDE);
  }
}

module back_keyhole() {
  cx = PCB_LEN / 2;
  cy = PCB_WID - KEYHOLE_OFFSET_FROM_TOP;
  translate([cx, cy, -0.01])
    keyhole_negative();
}

module back_vents() {
  start_x = PCB_LEN / 2 - (VENT_COLS - 1) * VENT_PITCH_X / 2 - VENT_SLOT_LEN/2;
  start_y = PCB_WID / 2 + 5;
  translate([start_x, start_y, -0.01])
    vent_grid_negative();
}

// =============================================================
// HANGER BRACKET — standalone part. Pegs snap into back-shell sockets;
// fixture tab takes a single M4 screw up into a light fixture.
// =============================================================
// Render orientation (what you see in OpenSCAD preview): the fixture
// tab lies on the XY plane at Z=0 and the body rises in +Z to a
// tilted case-mount slab. For printing, this same orientation works
// well — the tab is the natural raft surface, and the slab + body
// overhangs print self-supported at HANGER_TILT_DEG (45° default is
// safely within FDM angle limits).
//
// Installed orientation (mentally flip 180°): fixture tab is up
// against the bottom of the fixture, body hangs down, case attaches
// to the slab. The angle between fixture tab and case-mount face
// equals HANGER_TILT_DEG and equals the camera's tilt from vertical.
module hanger() {
  // Slab dimensions match the case's -X exterior face exactly so the
  // hanger looks flush against the case when assembled.
  slab_w = OUTER_Y;          // along Y axis (case Y dimension, 31.8 mm)
  slab_d = TOTAL_HEIGHT;     // along slab-local X (case Z dimension, 15.1 mm)
  slab_t = HANGER_SLAB_T;

  body_h = HANGER_BODY_HEIGHT;
  slab_center_z = body_h - slab_t / 2;

  // Position the pegs on the back-shell half of the slab so they
  // engage the sockets in the back shell (case Z ≈ SEAM_Z/2). In
  // slab-local X that's -slab_d/2 + SEAM_Z/2.
  peg_x_offset = -slab_d/2 + SEAM_Z/2;

  difference() {
    // Body = convex hull of the flat tab and the tilted slab.
    // Hull() handles all the wedge geometry automatically; no
    // trigonometry needed in code, the rotation drives the shape.
    hull() {
      translate([-HANGER_TAB_W/2, -HANGER_TAB_D/2, 0])
        rounded_box(HANGER_TAB_W, HANGER_TAB_D, HANGER_TAB_T, r=CASE_FILLET);

      translate([0, 0, slab_center_z])
        rotate([0, HANGER_TILT_DEG, 0])
          translate([-slab_d/2, -slab_w/2, -slab_t/2])
            rounded_box(slab_d, slab_w, slab_t, r=CASE_FILLET);
    }

    // M4 clearance hole through the fixture tab. User drives the
    // screw up from below into the fixture above.
    translate([0, 0, -0.01])
      cylinder(d=HANGER_SCREW_HOLE, h=HANGER_TAB_T + 0.02);
  }

  // Snap-in pegs. Project from the slab's case-mount face (the +Z
  // face in slab-local coords, which after rotation points away from
  // the body toward where the case will attach).
  translate([0, 0, slab_center_z])
    rotate([0, HANGER_TILT_DEG, 0])
      for (dy = [-HANGER_PEG_GAP/2, HANGER_PEG_GAP/2])
        translate([peg_x_offset, dy, slab_t/2 - 0.01])
          cylinder(d=HANGER_PEG_DIAM, h=HANGER_PEG_LEN + 0.01);
}

// =============================================================
// LAYOUT MODES
// =============================================================
module assembly_view() {
  pcb_dummy();
  back_shell();
  lid();
}

module exploded_view() {
  pcb_dummy();
  back_shell();
  // Lid lifted up
  translate([0, 0, 25]) lid();
}

// Top-level dispatch
if      (mode == "lid")       lid();
else if (mode == "back")      back_shell();
else if (mode == "assembly")  assembly_view();
else if (mode == "exploded")  exploded_view();
else if (mode == "hanger")    hanger();
else                          assembly_view();
